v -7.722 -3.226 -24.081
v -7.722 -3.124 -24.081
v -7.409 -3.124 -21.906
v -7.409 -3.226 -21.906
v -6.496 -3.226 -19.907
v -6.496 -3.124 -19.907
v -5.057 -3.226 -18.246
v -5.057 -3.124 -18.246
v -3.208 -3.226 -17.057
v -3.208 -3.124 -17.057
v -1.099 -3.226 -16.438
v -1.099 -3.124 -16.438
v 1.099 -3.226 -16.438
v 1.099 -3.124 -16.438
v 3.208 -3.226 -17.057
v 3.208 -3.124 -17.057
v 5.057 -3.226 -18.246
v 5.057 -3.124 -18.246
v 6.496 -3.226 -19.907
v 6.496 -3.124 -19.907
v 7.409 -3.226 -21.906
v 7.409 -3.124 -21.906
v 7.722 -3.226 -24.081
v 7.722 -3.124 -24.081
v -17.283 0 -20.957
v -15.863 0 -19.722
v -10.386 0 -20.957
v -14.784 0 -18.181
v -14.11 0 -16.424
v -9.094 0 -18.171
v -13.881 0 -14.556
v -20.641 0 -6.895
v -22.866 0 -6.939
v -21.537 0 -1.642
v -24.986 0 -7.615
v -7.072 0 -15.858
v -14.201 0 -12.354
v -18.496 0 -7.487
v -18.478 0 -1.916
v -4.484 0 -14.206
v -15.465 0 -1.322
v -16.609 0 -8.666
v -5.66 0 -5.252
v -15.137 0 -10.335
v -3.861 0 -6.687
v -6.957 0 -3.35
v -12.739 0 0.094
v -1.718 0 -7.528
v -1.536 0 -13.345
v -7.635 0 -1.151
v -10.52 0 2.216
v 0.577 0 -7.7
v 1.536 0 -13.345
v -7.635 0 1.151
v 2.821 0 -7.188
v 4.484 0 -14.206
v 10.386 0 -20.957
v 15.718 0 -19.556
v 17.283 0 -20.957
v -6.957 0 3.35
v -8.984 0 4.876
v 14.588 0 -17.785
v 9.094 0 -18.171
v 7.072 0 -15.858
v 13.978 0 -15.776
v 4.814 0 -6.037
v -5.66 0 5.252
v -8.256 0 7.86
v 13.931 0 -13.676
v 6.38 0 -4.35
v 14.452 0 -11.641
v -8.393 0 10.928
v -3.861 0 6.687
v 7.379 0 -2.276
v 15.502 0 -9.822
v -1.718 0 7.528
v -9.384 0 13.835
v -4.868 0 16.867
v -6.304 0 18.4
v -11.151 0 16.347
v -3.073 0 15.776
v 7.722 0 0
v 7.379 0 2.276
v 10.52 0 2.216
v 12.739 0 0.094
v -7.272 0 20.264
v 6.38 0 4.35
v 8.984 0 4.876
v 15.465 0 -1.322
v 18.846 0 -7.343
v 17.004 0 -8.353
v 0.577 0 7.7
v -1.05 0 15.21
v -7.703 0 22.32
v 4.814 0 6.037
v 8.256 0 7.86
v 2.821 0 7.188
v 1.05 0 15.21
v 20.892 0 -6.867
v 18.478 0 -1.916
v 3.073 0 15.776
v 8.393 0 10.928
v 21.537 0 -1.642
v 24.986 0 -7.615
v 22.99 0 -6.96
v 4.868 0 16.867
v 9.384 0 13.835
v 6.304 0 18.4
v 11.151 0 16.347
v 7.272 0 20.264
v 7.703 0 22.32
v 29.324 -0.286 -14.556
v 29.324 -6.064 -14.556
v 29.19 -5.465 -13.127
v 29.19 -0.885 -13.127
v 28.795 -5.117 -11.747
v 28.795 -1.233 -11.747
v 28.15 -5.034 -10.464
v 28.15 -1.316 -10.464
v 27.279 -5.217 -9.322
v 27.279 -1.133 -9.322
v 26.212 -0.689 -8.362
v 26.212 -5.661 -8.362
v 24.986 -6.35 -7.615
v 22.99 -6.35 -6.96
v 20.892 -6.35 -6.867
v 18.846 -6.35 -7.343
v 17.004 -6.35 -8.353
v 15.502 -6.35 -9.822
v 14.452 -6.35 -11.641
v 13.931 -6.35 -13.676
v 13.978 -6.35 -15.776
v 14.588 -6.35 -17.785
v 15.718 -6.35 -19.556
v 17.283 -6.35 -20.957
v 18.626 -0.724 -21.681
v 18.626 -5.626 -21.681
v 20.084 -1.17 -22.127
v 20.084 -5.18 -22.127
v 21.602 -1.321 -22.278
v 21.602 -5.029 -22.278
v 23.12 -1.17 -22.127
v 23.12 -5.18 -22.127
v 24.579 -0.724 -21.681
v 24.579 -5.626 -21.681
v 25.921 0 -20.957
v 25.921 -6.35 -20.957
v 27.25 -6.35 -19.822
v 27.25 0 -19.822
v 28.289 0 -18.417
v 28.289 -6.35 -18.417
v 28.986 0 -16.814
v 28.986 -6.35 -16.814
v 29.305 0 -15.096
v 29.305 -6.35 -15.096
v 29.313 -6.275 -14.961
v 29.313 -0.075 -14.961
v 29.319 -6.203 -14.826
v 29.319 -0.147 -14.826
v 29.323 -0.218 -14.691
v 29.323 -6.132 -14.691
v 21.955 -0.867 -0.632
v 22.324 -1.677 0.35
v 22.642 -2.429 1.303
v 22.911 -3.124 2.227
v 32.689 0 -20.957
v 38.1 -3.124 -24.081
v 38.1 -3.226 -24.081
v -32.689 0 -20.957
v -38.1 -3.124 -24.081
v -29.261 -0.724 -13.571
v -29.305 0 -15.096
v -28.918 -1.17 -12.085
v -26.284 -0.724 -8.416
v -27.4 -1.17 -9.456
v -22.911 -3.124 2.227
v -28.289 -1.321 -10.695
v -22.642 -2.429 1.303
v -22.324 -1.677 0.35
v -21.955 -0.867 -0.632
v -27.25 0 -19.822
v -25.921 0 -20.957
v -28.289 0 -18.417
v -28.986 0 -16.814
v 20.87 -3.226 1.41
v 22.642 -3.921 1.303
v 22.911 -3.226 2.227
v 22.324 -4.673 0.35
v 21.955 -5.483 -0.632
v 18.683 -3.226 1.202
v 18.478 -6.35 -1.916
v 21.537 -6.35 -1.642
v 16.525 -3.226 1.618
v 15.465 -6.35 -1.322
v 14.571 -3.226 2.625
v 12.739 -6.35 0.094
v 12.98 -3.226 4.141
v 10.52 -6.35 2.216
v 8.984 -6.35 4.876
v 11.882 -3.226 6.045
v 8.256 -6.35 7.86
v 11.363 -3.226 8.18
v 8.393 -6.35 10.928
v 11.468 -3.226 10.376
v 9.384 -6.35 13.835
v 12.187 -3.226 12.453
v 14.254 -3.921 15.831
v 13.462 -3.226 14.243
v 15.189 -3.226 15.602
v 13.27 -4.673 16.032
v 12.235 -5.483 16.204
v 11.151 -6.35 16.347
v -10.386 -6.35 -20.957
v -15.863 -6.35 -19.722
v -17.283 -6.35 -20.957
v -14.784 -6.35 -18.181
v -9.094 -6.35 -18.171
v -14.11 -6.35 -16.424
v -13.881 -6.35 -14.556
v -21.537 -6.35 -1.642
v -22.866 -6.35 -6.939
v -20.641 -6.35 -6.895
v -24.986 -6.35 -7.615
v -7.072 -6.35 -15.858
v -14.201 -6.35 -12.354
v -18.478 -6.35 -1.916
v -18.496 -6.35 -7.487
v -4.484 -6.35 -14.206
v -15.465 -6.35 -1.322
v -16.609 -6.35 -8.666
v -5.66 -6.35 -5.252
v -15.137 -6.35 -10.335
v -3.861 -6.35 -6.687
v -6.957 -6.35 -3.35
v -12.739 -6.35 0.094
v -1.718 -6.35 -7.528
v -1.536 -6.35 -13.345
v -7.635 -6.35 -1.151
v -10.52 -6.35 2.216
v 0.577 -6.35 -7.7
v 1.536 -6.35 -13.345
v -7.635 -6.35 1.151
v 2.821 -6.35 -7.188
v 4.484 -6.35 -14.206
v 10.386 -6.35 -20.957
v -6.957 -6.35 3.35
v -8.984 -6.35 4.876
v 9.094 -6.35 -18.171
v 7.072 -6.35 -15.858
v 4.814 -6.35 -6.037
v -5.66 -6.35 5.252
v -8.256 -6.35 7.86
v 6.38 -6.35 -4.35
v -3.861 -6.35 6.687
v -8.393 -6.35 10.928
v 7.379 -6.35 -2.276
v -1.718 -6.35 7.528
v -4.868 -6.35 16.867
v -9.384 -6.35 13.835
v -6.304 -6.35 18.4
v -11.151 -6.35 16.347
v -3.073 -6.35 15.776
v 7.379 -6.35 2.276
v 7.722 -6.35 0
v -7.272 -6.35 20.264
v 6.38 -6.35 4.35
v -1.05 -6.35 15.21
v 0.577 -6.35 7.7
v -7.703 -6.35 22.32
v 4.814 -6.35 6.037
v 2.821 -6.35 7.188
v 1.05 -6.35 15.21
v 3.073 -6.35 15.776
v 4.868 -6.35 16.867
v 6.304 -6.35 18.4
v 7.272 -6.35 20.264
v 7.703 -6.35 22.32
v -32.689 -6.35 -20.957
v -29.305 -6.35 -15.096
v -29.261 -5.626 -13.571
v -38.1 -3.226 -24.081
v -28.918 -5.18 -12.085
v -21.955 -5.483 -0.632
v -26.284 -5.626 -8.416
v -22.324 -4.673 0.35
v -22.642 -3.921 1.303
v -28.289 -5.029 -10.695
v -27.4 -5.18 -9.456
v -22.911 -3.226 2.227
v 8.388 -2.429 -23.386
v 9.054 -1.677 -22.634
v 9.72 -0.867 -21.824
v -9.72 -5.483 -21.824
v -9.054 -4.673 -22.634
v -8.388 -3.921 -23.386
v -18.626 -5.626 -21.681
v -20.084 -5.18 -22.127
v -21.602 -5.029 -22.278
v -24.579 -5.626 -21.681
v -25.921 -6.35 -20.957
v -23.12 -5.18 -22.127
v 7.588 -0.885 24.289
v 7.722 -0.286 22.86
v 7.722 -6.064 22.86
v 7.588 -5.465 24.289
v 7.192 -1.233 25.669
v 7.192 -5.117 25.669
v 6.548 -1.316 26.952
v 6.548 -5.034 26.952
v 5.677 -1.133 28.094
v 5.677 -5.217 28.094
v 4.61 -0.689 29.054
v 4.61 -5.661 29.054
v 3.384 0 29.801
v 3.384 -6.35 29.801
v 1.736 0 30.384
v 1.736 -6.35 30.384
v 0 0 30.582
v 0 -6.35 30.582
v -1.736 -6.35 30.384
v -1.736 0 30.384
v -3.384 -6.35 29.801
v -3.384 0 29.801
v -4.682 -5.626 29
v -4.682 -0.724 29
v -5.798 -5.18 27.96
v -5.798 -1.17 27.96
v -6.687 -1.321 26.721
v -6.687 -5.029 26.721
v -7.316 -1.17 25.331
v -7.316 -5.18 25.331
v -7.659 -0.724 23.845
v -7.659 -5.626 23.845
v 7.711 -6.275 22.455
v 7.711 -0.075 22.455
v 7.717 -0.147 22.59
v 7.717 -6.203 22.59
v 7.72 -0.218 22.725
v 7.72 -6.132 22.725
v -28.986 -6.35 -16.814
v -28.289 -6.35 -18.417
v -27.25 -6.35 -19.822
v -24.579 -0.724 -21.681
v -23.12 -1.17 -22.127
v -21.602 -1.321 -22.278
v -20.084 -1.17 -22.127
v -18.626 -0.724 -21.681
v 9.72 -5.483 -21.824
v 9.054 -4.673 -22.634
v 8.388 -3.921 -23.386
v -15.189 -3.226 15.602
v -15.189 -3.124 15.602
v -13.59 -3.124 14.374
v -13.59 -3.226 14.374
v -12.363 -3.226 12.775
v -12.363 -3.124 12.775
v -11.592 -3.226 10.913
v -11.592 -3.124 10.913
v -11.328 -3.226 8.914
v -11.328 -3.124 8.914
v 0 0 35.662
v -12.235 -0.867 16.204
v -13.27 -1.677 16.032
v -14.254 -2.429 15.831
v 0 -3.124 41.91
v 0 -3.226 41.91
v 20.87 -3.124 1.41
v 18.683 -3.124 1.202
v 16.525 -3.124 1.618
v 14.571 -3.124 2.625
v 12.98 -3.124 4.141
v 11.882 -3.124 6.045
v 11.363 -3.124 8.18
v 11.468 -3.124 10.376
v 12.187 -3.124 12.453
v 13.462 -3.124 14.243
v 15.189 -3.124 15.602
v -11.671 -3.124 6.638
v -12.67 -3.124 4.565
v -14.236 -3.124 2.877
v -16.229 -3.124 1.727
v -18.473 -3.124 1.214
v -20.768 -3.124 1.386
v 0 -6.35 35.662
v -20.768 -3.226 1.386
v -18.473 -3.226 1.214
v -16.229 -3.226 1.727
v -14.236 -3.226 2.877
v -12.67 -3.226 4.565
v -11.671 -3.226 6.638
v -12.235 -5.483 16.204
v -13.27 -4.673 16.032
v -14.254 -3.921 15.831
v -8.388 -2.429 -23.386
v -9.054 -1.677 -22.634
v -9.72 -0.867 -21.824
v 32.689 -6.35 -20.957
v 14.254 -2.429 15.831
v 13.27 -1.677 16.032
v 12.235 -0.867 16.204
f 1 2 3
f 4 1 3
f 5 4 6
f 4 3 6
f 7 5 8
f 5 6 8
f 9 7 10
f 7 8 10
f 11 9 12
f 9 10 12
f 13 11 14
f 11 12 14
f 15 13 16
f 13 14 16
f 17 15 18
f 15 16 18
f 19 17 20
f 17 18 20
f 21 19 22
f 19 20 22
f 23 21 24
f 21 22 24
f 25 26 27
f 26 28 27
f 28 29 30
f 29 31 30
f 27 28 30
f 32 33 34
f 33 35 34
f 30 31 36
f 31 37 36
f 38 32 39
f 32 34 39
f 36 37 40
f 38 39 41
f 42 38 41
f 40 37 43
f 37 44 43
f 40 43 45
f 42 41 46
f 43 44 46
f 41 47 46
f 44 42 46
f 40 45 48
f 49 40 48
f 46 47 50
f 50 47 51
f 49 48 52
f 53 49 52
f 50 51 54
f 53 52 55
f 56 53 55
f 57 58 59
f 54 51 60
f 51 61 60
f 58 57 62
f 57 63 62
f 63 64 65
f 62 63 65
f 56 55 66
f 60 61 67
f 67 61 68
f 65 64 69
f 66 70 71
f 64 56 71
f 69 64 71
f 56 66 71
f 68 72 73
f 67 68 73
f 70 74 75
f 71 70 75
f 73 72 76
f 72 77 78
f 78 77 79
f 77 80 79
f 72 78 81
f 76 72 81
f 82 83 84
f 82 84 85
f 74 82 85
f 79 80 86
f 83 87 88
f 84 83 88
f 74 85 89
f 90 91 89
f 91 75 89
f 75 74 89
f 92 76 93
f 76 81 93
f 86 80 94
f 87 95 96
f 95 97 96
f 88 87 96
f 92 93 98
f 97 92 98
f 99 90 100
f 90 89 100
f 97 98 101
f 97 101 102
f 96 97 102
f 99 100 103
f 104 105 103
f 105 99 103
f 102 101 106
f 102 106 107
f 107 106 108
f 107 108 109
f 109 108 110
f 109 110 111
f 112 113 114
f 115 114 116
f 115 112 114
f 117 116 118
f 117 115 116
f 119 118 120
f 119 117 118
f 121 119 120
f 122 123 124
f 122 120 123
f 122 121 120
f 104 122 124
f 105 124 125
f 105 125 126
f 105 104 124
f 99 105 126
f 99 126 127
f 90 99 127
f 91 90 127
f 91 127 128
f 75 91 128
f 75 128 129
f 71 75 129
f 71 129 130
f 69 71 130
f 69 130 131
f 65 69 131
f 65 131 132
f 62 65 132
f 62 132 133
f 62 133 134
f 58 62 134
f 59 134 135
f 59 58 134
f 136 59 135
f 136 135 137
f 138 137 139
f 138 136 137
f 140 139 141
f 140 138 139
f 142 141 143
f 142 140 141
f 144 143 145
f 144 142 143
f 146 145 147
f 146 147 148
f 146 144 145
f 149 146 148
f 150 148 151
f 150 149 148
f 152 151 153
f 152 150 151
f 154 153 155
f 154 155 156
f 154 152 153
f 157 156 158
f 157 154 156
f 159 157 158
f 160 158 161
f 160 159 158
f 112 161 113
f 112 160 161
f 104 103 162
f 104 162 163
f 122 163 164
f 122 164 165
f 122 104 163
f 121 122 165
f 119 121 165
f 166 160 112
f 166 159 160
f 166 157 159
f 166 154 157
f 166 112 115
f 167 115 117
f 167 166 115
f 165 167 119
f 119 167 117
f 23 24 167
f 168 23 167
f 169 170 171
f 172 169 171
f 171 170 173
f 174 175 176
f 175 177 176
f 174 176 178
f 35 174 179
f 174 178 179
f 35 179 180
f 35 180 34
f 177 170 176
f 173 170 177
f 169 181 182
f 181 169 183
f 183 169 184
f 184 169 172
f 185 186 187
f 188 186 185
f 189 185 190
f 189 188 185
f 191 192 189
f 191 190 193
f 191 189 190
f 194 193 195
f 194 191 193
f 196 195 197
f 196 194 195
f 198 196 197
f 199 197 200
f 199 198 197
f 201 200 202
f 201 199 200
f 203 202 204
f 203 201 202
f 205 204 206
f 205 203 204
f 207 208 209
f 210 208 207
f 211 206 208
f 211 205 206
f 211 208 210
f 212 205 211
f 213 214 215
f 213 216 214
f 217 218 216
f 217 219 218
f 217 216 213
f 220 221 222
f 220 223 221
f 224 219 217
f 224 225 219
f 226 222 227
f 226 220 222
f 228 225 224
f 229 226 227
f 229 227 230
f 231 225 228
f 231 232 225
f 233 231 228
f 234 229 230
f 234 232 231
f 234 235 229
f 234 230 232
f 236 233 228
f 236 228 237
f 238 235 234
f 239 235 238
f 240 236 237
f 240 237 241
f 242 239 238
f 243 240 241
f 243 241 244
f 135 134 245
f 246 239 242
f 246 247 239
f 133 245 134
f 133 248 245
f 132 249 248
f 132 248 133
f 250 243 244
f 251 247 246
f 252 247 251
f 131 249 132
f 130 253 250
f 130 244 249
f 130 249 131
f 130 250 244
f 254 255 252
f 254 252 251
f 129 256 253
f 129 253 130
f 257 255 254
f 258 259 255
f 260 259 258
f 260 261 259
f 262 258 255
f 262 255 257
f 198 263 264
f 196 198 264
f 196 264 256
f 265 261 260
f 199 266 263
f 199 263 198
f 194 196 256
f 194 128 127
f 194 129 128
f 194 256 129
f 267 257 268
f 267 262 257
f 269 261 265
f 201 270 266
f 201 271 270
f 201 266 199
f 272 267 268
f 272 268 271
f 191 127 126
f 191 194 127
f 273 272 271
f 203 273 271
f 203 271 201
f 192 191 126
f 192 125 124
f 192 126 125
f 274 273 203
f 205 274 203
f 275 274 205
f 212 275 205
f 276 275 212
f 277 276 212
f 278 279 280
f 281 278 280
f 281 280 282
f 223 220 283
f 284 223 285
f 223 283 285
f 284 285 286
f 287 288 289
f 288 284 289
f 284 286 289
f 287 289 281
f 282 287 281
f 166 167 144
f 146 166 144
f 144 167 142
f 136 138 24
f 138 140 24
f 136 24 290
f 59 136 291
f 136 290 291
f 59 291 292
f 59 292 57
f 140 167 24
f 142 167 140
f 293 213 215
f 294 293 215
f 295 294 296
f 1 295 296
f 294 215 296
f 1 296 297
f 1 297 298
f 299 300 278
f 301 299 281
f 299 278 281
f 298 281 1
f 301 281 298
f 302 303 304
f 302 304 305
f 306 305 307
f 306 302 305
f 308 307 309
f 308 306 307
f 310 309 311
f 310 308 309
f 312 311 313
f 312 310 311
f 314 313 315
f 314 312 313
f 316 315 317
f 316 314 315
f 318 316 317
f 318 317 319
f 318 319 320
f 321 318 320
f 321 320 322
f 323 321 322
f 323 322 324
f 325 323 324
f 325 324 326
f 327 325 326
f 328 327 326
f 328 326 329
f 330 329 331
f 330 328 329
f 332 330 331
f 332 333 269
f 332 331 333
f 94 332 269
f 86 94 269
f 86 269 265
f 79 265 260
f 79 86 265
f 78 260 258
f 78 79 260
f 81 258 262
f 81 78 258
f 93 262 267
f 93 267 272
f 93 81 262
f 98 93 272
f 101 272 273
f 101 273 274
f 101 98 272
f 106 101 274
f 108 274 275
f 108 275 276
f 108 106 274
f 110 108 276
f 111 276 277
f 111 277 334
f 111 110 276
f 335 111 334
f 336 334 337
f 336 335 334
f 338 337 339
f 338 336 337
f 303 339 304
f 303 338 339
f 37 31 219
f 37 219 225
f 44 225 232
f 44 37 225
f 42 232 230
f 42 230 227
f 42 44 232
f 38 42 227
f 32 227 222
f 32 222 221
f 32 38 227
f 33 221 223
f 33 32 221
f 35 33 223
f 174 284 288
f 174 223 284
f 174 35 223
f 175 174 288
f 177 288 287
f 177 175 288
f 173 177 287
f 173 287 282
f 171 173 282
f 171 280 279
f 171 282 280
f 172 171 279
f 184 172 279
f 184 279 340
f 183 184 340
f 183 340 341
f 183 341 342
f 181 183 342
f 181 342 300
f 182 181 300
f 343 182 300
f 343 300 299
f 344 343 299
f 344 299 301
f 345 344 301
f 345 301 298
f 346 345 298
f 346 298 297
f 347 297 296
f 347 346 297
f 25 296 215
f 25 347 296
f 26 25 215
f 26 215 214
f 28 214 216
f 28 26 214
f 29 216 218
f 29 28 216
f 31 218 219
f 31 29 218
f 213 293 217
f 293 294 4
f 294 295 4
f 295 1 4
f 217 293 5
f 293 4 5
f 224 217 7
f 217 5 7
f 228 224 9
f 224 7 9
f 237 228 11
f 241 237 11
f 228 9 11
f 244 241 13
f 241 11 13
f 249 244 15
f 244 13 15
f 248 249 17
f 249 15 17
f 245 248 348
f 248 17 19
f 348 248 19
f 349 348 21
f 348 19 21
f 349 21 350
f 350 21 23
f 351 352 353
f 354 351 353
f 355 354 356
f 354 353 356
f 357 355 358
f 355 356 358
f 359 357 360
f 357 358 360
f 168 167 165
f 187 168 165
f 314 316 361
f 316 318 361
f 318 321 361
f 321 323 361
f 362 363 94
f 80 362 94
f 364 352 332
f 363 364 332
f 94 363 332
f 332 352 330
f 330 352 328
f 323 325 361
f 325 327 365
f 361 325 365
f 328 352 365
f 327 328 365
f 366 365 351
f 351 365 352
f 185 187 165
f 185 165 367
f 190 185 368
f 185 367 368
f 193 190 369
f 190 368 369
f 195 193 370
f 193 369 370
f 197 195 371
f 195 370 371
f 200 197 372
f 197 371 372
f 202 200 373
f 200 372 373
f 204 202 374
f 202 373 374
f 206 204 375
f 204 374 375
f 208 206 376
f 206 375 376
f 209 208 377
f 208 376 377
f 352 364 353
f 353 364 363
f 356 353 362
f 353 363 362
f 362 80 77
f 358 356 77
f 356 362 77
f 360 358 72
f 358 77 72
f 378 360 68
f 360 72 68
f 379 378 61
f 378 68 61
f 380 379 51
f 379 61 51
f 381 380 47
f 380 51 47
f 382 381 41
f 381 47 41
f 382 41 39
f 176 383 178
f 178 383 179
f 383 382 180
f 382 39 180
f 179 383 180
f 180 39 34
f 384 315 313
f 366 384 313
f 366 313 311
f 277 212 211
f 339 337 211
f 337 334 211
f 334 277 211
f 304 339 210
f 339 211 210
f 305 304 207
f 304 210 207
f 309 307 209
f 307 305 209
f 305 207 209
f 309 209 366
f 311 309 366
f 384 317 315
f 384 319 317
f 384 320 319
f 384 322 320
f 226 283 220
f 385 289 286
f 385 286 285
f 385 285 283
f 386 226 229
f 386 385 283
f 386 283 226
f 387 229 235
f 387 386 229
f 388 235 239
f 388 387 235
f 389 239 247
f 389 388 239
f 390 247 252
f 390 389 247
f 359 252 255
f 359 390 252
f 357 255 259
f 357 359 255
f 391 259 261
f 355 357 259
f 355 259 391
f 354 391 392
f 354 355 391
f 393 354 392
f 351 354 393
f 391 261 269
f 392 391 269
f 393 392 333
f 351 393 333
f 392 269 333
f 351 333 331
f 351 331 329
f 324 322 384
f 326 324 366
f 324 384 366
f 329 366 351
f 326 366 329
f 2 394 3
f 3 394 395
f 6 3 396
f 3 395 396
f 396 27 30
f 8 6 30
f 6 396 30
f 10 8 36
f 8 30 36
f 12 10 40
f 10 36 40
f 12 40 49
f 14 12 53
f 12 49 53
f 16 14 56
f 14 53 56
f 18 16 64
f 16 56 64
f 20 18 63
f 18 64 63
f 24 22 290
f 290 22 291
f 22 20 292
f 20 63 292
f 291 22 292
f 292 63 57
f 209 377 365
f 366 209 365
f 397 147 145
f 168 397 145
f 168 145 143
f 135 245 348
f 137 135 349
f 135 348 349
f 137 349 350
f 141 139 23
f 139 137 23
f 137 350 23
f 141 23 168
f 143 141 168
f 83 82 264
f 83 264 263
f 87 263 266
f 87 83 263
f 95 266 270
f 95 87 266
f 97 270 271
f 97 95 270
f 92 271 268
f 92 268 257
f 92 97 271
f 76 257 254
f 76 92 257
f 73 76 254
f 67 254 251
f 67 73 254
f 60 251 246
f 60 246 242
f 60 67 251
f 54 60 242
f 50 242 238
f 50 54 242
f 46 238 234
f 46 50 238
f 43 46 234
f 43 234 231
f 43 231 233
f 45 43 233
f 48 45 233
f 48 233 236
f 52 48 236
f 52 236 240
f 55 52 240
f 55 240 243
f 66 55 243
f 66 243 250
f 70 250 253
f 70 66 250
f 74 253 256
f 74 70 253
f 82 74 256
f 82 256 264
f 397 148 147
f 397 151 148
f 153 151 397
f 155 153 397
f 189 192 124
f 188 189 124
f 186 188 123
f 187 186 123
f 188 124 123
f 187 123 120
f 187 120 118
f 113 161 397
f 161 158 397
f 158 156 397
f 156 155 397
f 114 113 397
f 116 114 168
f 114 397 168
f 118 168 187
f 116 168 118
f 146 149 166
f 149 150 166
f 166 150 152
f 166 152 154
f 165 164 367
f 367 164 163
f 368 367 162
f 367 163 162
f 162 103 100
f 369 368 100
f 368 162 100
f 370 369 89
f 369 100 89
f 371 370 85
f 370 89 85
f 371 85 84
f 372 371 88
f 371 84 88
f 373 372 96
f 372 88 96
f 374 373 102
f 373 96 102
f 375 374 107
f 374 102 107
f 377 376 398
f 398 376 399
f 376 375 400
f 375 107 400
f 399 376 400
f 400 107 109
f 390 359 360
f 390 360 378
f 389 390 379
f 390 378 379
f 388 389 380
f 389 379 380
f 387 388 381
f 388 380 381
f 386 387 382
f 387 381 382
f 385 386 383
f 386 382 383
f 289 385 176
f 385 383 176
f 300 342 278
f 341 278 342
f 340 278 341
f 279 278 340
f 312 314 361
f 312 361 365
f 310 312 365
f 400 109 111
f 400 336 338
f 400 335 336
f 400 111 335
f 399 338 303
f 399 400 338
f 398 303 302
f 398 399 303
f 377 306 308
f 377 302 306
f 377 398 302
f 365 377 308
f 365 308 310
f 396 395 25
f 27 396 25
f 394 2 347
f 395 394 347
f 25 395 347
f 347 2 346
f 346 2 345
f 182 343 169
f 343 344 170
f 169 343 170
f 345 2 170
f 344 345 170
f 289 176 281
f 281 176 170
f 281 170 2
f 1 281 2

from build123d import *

# Parameters (mm, degrees)
F0_R         = 7.7216
F1_DEPTH     = 6.35
F2_T1_DEPTH  = 46.447303982
F2_T3_DEPTH  = 46.447303982
F2_T5_DEPTH  = 46.447303982
F2_T7_DEPTH  = 46.447303982
F2_T9_DEPTH  = 46.447303982
F2_T11_DEPTH = 46.447303982
F2_T14_ANGLE = 299.426156199
F2_T16_ANGLE = 299.426156199
F2_T18_ANGLE = 299.426156199
F2_T20_ANGLE = 299.426156199
F2_T22_ANGLE = 299.426156199
F2_T24_ANGLE = 299.426156199


# Not quite as in the source:
# - a fillet or chamfer that OpenCascade refuses, or shapes differently, is made with other operations: its cross-section is extruded or revolved along the edge and cut away or added


with BuildPart() as f1:
    # F0 (on Front) → F1 (new body)
    with BuildSketch(Plane.XZ):
        with BuildLine():
            Line((-22.9108, 2.227330358), (-38.1, -24.0811357684))
            Line((-38.1, -24.0811357684), (-7.7216, -24.0811357684))
            ThreePointArc((-7.7216, -24.0811357684), (0, -16.3595357684), (7.7216, -24.0811357684))
            Line((7.7216, -24.0811357684), (38.1, -24.0811357684))
            Line((38.1, -24.0811357684), (22.9108, 2.227330358))
            ThreePointArc((22.9108, 2.227330358), (12.3628982421, 5.0536321158), (15.1892, 15.6015338737))
            Line((15.1892, 15.6015338737), (0, 41.91))
            Line((0, 41.91), (-15.1892, 15.6015338737))
            ThreePointArc((-15.1892, 15.6015338737), (-12.3628982421, 12.7752321158), (-11.3284, 8.9144321158))
            ThreePointArc((-11.3284, 8.9144321158), (-15.1892, 2.227330358), (-22.9108, 2.227330358))
        make_face()
        with Locations((-21.6022160579, -14.5561357684)):
            Circle(F0_R, mode=Mode.SUBTRACT)
        with Locations((21.6022160579, -14.5561357684)):
            Circle(F0_R, mode=Mode.SUBTRACT)
        Circle(F0_R, mode=Mode.SUBTRACT)
        with Locations((0, 22.86)):
            Circle(F0_R, mode=Mode.SUBTRACT)
    extrude(amount=F1_DEPTH)

    # F2: chamfer of 3.1242 on 18 edges, made by hand

    # F2_s2 → F2_t1 (cut)
    with BuildSketch(Plane(origin=(-0.7460116682, 0, -1.2921301124), x_dir=(0, 1, 0), z_dir=(-0.5, 0, -0.8660254038))):
        Polygon((-6.35, -17.8308), (-3.2258, -20.955), (-6.35, -20.955), align=None)
        Polygon((-3.1242, -20.955), (0, -17.8308), (0, -20.955), align=None)
    extrude(amount=F2_T1_DEPTH, mode=Mode.SUBTRACT)

    # F2_s4 → F2_t3 (cut)
    with BuildSketch(Plane(origin=(22.1647883318, 0, 38.3905395297), x_dir=(0, 1, 0), z_dir=(-0.5, 0, -0.8660254038))):
        Polygon((-6.35, -17.8308), (-3.2258, -20.955), (-6.35, -20.955), align=None)
        Polygon((-3.1242, -20.955), (0, -17.8308), (0, -20.955), align=None)
    extrude(amount=F2_T3_DEPTH, mode=Mode.SUBTRACT)

    # F2_s6 → F2_t5 (cut)
    with BuildSketch(Plane(origin=(1.0588636592, 0, -1.834005656), x_dir=(0, 1, 0), z_dir=(-0.5, 0, 0.8660254038))):
        Polygon((-6.35, -17.8308), (-3.2258, -20.955), (-6.35, -20.955), align=None)
        Polygon((0, -17.8308), (-3.1242, -20.955), (0, -20.955), align=None)
    extrude(amount=F2_T5_DEPTH, mode=Mode.SUBTRACT)

    # F2_s8 → F2_t7 (cut)
    with BuildSketch(Plane(origin=(23.9696636592, 0, -41.5166752981), x_dir=(0, 1, 0), z_dir=(-0.5, 0, 0.8660254038))):
        Polygon((-6.35, -17.8308), (-3.2258, -20.955), (-6.35, -20.955), align=None)
        Polygon((0, -17.8308), (-3.1242, -20.955), (0, -20.955), align=None)
    extrude(amount=F2_T7_DEPTH, mode=Mode.SUBTRACT)

    # F2_s10 → F2_t9 (cut)
    with BuildSketch(Plane.YZ.offset(-0.312851991)):
        Polygon((-6.35, -20.9569357684), (-3.2258, -24.0811357684), (-6.35, -24.0811357684), align=None)
        Polygon((-3.1242, -24.0811357684), (0, -20.9569357684), (0, -24.0811357684), align=None)
    extrude(amount=F2_T9_DEPTH, mode=Mode.SUBTRACT)

    # F2_s12 → F2_t11 (cut)
    with BuildSketch(Plane.YZ.offset(-46.134451991)):
        Polygon((-6.35, -20.9569357684), (-3.2258, -24.0811357684), (-6.35, -24.0811357684), align=None)
        Polygon((-3.1242, -24.0811357684), (0, -20.9569357684), (0, -24.0811357684), align=None)
    extrude(amount=F2_T11_DEPTH, mode=Mode.SUBTRACT)

    # F2_s13 → F2_t14 (revolve, cut)
    with BuildSketch(Plane(origin=(-0.0451180595, 0, 9.0096042642), x_dir=(0, 1, 0), z_dir=(-0.0050077109, 0, 0.9999874613))):
        Polygon((-6.35, 29.8509202393), (-3.2258, 26.7267202393), (-6.35, 26.7267202393), align=None)
    revolve(axis=Axis((-19.05, -6.35, 8.9144321158), (0, -1, 0)), revolution_arc=F2_T14_ANGLE, mode=Mode.SUBTRACT)

    # F2_s15 → F2_t16 (revolve, cut)
    with BuildSketch(Plane(origin=(0.0451180595, 0, 9.0096042642), x_dir=(0, 1, 0), z_dir=(0.0050077109, 0, 0.9999874613))):
        Polygon((-3.2258, -26.7267202393), (-6.35, -29.8509202393), (-6.35, -26.7267202393), align=None)
    revolve(axis=Axis((19.05, -6.35, 8.9144321158), (0, 1, 0)), revolution_arc=F2_T16_ANGLE, mode=Mode.SUBTRACT)

    # F2_s17 → F2_t18 (revolve, cut)
    with BuildSketch(Plane(origin=(10.4872096098, 0, -6.1250197631), x_dir=(0, 1, 0), z_dir=(0.8635106895, 0, -0.5043305355))):
        Polygon((-6.35, -31.6401181517), (-3.2258, -28.5159181517), (-6.35, -28.5159181517), align=None)
    revolve(axis=Axis((0, -6.35, -24.0811357684), (0, 1, 0)), revolution_arc=F2_T18_ANGLE, mode=Mode.SUBTRACT)

    # F2_s19 → F2_t20 (revolve, cut)
    with BuildSketch(Plane(origin=(10.4872096098, 0, -6.1250197631), x_dir=(0, 1, 0), z_dir=(0.8635106895, 0, -0.5043305355))):
        Polygon((-3.1242, -28.5159181517), (0, -31.6401181517), (0, -28.5159181517), align=None)
    revolve(axis=Axis((0, 0, -24.0811357684), (0, 1, 0)), revolution_arc=F2_T20_ANGLE, mode=Mode.SUBTRACT)

    # F2_s21 → F2_t22 (revolve, cut)
    with BuildSketch(Plane(origin=(0.0451180595, 0, 9.0096042642), x_dir=(0, 1, 0), z_dir=(0.0050077109, 0, 0.9999874613))):
        Polygon((-3.1242, -26.7267202393), (0, -29.8509202393), (0, -26.7267202393), align=None)
    revolve(axis=Axis((19.05, 0, 8.9144321158), (0, 1, 0)), revolution_arc=F2_T22_ANGLE, mode=Mode.SUBTRACT)

    # F2_s23 → F2_t24 (revolve, cut)
    with BuildSketch(Plane(origin=(-10.5323276693, 0, -6.0107202694), x_dir=(0, 1, 0), z_dir=(-0.8685184004, 0, -0.4956569258))):
        Polygon((-3.1242, -24.9062127584), (0, -28.0304127584), (0, -24.9062127584), align=None)
    revolve(axis=Axis((-19.05, 0, 8.9144321158), (0, 1, 0)), revolution_arc=F2_T24_ANGLE, mode=Mode.SUBTRACT)


solid = f1.part
